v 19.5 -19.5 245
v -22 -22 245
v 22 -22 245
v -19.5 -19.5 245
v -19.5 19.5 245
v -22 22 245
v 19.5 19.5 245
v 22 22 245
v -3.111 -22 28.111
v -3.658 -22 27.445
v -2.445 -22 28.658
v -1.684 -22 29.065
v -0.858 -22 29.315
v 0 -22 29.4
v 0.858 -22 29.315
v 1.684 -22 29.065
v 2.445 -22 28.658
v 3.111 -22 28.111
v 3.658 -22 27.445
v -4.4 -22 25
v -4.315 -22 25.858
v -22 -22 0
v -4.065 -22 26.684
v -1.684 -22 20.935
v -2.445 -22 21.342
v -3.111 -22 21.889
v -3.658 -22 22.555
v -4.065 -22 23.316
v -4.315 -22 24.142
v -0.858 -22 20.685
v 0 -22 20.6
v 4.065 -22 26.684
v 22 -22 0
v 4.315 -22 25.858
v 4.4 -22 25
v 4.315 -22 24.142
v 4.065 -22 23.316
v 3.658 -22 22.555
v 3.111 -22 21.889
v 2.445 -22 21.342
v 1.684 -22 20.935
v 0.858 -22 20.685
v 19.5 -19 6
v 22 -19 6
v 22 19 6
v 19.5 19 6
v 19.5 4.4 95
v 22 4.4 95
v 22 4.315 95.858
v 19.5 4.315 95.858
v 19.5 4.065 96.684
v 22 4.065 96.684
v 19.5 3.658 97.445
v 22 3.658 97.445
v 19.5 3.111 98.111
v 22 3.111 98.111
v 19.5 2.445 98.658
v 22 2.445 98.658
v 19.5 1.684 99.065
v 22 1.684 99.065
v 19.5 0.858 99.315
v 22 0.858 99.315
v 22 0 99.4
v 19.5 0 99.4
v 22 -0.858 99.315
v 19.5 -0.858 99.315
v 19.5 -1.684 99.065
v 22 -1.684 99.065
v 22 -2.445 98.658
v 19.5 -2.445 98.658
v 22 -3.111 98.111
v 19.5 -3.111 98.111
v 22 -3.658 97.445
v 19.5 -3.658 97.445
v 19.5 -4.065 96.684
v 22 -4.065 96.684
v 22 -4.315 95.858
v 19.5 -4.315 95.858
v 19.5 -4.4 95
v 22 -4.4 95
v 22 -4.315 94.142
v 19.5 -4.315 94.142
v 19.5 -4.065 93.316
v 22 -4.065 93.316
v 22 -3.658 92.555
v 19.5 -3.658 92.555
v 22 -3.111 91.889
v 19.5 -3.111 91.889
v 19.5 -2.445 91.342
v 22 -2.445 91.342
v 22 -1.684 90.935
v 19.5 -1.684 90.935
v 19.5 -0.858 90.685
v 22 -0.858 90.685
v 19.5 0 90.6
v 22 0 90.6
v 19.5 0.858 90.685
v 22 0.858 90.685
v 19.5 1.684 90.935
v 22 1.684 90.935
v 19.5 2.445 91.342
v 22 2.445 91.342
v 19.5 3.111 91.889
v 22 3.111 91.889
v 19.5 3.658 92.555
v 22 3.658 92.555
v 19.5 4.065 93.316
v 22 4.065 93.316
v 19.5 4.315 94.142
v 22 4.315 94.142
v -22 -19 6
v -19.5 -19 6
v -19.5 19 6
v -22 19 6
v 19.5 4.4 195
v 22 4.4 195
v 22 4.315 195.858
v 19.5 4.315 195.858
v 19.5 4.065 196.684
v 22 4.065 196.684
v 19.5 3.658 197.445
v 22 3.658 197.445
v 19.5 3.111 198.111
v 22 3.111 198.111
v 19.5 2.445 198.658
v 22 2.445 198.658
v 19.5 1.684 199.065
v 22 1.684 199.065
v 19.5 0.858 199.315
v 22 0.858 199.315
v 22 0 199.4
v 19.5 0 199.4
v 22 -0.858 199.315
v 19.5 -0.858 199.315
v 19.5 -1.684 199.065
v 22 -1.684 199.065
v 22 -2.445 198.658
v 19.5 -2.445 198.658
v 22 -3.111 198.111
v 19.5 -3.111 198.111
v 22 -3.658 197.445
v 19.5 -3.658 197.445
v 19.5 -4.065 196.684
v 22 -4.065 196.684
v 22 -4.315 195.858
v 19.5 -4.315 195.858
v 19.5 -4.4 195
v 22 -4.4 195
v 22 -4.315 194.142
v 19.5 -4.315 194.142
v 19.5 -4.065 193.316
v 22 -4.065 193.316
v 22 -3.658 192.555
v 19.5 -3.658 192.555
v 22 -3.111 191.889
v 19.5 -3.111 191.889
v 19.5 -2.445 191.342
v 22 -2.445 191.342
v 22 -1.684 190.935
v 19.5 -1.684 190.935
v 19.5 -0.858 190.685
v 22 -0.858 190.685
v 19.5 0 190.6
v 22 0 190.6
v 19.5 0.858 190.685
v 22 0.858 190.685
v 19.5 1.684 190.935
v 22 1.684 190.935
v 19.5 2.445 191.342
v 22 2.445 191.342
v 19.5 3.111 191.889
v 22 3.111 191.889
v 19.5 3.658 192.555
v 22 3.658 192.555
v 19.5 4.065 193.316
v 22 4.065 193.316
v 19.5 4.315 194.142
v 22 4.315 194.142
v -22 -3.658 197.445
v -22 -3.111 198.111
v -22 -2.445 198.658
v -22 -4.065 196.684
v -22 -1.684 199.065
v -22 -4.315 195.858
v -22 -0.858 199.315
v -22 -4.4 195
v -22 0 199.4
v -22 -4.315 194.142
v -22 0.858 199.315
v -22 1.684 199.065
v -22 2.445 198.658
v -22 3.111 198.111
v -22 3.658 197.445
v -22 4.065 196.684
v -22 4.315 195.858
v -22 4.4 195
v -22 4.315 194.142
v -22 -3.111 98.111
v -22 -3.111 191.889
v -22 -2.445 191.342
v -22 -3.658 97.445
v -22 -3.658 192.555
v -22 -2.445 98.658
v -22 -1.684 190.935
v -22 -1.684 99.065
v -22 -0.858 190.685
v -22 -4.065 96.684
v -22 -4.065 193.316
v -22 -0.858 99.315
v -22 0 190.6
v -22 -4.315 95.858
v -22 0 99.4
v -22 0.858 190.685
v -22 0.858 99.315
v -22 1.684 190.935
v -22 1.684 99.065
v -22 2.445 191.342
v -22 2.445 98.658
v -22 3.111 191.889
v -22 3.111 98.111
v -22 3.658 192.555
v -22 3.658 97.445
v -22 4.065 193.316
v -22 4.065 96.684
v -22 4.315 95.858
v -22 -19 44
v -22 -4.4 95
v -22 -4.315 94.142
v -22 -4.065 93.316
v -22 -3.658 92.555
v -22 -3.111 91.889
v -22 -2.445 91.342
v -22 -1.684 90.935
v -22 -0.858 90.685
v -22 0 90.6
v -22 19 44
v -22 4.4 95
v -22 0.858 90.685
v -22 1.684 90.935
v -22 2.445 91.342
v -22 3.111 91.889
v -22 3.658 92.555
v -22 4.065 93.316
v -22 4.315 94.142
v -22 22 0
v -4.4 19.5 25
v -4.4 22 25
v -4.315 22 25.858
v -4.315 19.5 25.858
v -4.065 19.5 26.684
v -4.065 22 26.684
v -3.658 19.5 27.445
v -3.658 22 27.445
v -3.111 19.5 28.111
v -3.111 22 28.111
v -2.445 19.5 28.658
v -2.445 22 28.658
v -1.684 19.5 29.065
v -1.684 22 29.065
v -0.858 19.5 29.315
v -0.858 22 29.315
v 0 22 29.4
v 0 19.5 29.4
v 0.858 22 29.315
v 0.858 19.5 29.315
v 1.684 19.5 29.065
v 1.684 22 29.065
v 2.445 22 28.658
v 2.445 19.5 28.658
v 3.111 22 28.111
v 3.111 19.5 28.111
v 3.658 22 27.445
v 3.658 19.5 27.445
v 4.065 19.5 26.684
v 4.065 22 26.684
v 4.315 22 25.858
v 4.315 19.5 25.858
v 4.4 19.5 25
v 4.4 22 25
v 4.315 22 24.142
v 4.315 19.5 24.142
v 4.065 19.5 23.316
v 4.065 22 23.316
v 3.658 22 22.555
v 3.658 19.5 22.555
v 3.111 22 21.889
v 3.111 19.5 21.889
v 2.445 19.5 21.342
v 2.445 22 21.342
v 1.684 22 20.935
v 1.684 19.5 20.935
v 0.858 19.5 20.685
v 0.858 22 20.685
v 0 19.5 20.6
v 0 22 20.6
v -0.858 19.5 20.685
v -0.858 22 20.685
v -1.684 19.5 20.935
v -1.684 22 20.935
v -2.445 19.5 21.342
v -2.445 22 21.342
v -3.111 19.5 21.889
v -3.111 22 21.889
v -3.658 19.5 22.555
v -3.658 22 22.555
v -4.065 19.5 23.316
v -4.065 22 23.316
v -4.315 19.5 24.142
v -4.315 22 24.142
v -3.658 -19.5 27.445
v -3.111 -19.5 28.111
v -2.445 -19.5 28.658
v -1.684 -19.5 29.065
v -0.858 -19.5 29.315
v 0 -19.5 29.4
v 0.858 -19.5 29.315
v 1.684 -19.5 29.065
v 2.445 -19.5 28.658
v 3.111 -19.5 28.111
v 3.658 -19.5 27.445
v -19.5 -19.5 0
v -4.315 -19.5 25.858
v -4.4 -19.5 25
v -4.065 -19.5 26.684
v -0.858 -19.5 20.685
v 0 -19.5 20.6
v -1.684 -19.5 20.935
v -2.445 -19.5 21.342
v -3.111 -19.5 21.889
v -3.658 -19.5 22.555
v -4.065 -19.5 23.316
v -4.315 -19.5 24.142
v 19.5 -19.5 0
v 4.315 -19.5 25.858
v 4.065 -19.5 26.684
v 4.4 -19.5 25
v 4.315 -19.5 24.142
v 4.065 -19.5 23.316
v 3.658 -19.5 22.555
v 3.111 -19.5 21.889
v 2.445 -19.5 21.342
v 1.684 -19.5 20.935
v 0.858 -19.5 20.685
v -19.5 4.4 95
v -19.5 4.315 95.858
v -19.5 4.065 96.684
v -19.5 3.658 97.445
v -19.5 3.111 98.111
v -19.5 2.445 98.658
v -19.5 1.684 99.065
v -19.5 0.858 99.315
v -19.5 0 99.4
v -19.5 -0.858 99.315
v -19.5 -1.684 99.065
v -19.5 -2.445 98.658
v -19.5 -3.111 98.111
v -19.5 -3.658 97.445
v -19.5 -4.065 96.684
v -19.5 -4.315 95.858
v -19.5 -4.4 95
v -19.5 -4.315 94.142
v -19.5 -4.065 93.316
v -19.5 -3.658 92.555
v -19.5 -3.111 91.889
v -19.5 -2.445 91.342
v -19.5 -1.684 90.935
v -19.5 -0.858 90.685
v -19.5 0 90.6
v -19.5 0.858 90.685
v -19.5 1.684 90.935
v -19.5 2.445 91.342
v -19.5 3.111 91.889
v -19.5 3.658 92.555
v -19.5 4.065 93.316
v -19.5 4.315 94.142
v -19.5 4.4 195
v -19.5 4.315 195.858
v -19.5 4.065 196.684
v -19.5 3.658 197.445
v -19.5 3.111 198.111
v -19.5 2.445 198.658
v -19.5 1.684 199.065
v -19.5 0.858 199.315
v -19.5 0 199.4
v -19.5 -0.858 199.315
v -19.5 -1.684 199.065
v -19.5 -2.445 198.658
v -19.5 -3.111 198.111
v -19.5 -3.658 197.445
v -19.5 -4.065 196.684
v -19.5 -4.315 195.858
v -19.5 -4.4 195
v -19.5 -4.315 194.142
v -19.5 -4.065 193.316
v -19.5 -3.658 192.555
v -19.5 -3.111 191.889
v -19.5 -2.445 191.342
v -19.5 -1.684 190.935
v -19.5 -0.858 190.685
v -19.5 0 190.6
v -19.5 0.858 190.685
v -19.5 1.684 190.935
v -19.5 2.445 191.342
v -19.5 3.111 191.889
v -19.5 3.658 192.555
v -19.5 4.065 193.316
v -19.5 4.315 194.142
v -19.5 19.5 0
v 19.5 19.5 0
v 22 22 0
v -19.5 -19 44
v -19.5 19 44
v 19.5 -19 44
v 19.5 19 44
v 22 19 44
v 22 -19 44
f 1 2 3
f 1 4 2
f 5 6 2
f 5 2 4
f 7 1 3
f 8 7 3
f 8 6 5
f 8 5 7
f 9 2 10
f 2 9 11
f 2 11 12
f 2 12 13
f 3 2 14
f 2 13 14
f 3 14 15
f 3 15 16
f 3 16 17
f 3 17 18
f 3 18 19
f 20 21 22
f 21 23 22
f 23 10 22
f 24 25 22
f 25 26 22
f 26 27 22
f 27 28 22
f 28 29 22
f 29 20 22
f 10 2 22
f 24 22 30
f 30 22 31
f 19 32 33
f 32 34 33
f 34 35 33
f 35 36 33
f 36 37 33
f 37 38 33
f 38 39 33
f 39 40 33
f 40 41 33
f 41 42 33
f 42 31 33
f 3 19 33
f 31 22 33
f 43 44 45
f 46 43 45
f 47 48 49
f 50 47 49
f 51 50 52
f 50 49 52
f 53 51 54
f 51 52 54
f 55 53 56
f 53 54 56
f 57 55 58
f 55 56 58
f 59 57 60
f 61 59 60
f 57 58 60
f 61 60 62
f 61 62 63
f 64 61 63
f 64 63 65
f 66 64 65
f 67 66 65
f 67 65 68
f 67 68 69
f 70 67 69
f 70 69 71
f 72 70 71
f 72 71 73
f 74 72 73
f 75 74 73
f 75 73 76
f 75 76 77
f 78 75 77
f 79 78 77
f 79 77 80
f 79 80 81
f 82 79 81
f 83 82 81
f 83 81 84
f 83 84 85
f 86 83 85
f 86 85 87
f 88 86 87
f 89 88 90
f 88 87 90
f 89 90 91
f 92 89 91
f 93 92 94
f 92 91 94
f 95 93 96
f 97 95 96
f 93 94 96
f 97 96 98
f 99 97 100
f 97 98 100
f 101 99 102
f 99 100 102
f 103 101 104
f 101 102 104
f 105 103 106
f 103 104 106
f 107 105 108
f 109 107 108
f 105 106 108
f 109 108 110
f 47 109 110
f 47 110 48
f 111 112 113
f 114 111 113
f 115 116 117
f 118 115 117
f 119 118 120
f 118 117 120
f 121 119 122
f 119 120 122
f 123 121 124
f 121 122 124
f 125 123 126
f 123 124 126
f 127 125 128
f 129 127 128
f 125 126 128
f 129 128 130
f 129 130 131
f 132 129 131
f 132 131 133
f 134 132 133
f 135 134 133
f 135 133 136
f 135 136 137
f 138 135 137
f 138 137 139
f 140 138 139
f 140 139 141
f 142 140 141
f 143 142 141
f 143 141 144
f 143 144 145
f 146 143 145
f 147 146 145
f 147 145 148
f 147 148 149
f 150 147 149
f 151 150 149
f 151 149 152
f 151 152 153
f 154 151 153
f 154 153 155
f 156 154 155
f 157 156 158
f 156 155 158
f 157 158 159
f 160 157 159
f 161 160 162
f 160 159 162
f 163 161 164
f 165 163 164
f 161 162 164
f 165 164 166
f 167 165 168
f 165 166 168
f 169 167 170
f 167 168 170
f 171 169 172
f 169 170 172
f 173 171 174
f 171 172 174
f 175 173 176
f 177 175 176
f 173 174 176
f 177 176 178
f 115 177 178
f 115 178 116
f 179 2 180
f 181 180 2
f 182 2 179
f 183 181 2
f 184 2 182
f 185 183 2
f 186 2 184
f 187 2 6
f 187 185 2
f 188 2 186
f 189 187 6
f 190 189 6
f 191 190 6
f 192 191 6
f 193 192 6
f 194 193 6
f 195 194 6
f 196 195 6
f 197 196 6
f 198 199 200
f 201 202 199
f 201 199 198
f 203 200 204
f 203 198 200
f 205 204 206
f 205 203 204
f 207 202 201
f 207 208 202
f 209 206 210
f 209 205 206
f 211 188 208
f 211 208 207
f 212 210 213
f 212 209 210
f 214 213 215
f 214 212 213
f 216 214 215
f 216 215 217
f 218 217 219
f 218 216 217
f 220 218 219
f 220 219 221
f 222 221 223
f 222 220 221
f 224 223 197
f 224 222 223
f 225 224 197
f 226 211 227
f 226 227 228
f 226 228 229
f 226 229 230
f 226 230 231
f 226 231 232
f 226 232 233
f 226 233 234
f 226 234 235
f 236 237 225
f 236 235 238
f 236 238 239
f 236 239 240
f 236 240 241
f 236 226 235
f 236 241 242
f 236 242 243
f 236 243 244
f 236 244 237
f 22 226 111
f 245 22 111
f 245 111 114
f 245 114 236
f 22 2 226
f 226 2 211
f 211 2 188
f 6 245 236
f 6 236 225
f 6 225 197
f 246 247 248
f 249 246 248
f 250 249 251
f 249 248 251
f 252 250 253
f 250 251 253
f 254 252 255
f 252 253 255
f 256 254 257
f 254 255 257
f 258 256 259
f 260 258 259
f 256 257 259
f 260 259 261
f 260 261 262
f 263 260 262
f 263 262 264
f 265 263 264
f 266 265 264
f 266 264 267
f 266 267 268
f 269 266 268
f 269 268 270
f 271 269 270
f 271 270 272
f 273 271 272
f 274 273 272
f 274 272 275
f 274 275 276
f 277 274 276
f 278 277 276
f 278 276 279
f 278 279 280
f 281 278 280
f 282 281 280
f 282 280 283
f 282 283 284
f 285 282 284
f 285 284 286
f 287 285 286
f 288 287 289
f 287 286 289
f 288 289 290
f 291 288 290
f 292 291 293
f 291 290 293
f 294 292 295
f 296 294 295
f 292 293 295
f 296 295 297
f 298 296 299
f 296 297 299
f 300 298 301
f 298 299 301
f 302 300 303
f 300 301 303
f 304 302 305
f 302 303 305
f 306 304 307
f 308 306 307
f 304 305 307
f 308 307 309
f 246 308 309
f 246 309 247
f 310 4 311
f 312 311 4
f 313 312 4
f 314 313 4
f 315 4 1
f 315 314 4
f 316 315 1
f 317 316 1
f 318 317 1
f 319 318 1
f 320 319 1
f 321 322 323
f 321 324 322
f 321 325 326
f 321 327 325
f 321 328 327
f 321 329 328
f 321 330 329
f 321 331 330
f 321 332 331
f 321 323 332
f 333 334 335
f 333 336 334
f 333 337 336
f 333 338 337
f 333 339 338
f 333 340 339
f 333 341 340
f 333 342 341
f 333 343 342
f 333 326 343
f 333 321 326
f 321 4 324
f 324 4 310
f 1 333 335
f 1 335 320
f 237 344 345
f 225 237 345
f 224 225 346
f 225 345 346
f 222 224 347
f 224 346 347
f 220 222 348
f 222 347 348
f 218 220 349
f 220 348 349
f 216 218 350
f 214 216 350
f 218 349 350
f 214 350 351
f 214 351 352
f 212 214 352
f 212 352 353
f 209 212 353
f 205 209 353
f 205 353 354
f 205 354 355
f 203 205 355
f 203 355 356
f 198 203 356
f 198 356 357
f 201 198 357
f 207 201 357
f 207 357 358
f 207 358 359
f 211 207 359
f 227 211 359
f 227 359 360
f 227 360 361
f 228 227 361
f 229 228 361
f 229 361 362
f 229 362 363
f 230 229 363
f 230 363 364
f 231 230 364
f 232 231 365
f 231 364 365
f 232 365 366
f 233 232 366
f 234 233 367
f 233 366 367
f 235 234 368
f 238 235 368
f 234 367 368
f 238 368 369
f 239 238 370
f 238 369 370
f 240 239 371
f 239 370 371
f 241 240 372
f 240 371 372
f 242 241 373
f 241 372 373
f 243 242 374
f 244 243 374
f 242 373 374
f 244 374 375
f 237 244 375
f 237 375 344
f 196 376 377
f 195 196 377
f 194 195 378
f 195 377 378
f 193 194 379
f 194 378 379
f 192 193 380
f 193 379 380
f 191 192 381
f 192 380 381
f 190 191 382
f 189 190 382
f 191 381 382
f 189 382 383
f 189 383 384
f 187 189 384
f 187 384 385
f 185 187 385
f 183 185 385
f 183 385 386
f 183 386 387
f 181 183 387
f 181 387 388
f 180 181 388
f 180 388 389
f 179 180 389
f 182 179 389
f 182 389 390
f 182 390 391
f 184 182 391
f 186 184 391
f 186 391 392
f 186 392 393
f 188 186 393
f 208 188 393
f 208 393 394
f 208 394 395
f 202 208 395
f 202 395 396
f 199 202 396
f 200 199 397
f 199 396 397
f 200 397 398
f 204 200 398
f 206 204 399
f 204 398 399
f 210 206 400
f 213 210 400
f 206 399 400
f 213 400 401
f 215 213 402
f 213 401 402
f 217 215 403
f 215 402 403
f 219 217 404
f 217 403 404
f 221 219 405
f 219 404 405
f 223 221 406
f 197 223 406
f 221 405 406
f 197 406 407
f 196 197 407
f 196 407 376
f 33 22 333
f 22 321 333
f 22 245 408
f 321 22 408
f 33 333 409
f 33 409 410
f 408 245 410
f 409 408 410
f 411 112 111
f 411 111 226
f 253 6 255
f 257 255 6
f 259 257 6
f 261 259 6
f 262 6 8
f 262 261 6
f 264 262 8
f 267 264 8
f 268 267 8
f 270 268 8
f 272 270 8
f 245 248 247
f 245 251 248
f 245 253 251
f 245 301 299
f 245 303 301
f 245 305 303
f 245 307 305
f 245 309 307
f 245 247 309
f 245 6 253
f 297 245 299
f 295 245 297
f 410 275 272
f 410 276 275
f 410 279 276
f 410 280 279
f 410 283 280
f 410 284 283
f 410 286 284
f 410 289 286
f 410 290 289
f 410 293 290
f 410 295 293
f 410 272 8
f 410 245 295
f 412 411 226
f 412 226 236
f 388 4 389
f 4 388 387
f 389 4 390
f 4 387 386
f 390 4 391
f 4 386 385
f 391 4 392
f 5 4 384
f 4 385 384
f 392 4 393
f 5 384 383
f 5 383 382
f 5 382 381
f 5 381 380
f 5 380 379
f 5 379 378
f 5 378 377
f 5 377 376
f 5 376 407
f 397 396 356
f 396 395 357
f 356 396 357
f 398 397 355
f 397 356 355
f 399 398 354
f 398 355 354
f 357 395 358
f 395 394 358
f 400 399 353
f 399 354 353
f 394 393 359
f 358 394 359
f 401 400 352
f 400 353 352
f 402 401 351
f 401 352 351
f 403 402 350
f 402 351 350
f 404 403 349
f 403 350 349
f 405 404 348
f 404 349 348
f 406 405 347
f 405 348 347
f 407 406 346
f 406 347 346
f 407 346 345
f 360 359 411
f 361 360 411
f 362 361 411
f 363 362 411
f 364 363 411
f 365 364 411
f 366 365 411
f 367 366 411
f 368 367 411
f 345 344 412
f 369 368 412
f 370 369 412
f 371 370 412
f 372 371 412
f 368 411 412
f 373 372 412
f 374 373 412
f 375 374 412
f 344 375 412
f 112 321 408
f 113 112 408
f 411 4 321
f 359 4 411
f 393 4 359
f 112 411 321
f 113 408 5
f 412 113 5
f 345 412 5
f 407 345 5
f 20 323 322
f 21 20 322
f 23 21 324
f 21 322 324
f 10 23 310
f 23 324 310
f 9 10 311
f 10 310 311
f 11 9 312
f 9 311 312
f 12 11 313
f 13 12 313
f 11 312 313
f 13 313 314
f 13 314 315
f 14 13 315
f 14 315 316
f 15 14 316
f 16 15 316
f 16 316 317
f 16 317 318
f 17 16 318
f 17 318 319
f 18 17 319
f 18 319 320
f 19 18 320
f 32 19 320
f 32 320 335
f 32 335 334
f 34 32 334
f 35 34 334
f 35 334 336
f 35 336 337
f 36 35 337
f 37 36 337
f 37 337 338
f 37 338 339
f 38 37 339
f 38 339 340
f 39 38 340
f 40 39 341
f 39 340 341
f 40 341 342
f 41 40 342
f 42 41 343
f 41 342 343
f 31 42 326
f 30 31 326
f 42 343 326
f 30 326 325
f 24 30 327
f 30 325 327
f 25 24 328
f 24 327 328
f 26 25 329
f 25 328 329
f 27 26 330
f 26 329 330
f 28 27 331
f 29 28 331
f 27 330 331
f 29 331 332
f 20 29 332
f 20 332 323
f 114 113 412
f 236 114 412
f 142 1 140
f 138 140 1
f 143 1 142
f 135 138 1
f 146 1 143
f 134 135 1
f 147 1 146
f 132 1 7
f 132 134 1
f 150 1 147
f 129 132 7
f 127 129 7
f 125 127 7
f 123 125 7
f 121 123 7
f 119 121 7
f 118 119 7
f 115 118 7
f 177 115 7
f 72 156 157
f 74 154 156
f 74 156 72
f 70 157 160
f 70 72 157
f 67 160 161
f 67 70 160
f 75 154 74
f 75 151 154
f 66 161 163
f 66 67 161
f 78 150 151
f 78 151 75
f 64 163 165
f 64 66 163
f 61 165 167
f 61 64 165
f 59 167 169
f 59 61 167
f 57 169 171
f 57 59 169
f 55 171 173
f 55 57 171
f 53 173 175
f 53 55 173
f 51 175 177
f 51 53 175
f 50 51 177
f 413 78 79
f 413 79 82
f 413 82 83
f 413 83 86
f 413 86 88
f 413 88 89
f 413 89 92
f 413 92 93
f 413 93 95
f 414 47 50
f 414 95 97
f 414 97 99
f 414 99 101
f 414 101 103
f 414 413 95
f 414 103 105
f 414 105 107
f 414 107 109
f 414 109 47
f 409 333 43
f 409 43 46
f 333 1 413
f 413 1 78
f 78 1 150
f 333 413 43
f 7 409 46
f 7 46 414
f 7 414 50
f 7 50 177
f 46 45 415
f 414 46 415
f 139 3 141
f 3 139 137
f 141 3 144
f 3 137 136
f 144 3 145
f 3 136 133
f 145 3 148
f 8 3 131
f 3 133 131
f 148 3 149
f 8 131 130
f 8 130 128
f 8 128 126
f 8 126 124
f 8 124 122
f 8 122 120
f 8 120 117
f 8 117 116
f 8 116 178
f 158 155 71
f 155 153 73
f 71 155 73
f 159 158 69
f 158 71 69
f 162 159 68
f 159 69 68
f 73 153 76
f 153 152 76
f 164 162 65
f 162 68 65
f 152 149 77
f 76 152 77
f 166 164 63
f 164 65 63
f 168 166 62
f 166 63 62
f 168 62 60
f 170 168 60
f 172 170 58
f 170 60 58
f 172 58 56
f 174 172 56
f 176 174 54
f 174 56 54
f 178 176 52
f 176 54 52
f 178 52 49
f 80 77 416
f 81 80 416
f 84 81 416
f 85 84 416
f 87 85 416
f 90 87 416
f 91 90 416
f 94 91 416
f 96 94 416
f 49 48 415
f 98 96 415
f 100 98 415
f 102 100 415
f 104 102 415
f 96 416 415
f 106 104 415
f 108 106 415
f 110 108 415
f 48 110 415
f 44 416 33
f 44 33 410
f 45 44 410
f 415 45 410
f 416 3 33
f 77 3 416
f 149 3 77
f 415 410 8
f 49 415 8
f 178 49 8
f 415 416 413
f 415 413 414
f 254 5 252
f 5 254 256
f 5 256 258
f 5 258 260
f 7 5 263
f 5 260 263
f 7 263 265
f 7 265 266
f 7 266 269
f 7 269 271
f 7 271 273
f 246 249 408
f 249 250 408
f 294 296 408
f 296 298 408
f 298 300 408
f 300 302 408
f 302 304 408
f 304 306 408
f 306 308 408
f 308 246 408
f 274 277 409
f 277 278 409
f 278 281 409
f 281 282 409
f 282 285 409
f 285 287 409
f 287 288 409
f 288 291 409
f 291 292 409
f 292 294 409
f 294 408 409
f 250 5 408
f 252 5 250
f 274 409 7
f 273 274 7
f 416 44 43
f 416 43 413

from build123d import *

# Parameters (mm, degrees)
F0_W     = 44
F0_H     = 44
F0_W_2   = 39
F0_H_2   = 39
F1_DEPTH = 245
F3_D     = 8.8
F4_W     = 38
F4_H     = 38
F5_DEPTH = 44.001
F7_D     = 8.8


with BuildPart() as f1:
    # F0 (on Top) → F1 (new body)
    with BuildSketch(Plane.XY):
        Rectangle(F0_W, F0_H)
        Rectangle(F0_W_2, F0_H_2, mode=Mode.SUBTRACT)
    extrude(amount=F1_DEPTH)

    # F3 (through all)
    with Locations(Plane(origin=(-22, 0, 0), x_dir=(0, -1, 0), z_dir=(-1, 0, 0))):
        with Locations((0, 195), (-1.2203e-06, 95)):
            Hole(F3_D / 2)

    # F4 (on face) → F5 (cut, through all)
    with BuildSketch(Plane.YZ.offset(22)):
        with Locations((0, 25)):
            Rectangle(F4_W, F4_H)
    extrude(amount=-F5_DEPTH, mode=Mode.SUBTRACT)

    # F7 (through all)
    with Locations(Plane.XZ.offset(22)):
        with Locations((0, 25)):
            Hole(F7_D / 2)


solid = f1.part
